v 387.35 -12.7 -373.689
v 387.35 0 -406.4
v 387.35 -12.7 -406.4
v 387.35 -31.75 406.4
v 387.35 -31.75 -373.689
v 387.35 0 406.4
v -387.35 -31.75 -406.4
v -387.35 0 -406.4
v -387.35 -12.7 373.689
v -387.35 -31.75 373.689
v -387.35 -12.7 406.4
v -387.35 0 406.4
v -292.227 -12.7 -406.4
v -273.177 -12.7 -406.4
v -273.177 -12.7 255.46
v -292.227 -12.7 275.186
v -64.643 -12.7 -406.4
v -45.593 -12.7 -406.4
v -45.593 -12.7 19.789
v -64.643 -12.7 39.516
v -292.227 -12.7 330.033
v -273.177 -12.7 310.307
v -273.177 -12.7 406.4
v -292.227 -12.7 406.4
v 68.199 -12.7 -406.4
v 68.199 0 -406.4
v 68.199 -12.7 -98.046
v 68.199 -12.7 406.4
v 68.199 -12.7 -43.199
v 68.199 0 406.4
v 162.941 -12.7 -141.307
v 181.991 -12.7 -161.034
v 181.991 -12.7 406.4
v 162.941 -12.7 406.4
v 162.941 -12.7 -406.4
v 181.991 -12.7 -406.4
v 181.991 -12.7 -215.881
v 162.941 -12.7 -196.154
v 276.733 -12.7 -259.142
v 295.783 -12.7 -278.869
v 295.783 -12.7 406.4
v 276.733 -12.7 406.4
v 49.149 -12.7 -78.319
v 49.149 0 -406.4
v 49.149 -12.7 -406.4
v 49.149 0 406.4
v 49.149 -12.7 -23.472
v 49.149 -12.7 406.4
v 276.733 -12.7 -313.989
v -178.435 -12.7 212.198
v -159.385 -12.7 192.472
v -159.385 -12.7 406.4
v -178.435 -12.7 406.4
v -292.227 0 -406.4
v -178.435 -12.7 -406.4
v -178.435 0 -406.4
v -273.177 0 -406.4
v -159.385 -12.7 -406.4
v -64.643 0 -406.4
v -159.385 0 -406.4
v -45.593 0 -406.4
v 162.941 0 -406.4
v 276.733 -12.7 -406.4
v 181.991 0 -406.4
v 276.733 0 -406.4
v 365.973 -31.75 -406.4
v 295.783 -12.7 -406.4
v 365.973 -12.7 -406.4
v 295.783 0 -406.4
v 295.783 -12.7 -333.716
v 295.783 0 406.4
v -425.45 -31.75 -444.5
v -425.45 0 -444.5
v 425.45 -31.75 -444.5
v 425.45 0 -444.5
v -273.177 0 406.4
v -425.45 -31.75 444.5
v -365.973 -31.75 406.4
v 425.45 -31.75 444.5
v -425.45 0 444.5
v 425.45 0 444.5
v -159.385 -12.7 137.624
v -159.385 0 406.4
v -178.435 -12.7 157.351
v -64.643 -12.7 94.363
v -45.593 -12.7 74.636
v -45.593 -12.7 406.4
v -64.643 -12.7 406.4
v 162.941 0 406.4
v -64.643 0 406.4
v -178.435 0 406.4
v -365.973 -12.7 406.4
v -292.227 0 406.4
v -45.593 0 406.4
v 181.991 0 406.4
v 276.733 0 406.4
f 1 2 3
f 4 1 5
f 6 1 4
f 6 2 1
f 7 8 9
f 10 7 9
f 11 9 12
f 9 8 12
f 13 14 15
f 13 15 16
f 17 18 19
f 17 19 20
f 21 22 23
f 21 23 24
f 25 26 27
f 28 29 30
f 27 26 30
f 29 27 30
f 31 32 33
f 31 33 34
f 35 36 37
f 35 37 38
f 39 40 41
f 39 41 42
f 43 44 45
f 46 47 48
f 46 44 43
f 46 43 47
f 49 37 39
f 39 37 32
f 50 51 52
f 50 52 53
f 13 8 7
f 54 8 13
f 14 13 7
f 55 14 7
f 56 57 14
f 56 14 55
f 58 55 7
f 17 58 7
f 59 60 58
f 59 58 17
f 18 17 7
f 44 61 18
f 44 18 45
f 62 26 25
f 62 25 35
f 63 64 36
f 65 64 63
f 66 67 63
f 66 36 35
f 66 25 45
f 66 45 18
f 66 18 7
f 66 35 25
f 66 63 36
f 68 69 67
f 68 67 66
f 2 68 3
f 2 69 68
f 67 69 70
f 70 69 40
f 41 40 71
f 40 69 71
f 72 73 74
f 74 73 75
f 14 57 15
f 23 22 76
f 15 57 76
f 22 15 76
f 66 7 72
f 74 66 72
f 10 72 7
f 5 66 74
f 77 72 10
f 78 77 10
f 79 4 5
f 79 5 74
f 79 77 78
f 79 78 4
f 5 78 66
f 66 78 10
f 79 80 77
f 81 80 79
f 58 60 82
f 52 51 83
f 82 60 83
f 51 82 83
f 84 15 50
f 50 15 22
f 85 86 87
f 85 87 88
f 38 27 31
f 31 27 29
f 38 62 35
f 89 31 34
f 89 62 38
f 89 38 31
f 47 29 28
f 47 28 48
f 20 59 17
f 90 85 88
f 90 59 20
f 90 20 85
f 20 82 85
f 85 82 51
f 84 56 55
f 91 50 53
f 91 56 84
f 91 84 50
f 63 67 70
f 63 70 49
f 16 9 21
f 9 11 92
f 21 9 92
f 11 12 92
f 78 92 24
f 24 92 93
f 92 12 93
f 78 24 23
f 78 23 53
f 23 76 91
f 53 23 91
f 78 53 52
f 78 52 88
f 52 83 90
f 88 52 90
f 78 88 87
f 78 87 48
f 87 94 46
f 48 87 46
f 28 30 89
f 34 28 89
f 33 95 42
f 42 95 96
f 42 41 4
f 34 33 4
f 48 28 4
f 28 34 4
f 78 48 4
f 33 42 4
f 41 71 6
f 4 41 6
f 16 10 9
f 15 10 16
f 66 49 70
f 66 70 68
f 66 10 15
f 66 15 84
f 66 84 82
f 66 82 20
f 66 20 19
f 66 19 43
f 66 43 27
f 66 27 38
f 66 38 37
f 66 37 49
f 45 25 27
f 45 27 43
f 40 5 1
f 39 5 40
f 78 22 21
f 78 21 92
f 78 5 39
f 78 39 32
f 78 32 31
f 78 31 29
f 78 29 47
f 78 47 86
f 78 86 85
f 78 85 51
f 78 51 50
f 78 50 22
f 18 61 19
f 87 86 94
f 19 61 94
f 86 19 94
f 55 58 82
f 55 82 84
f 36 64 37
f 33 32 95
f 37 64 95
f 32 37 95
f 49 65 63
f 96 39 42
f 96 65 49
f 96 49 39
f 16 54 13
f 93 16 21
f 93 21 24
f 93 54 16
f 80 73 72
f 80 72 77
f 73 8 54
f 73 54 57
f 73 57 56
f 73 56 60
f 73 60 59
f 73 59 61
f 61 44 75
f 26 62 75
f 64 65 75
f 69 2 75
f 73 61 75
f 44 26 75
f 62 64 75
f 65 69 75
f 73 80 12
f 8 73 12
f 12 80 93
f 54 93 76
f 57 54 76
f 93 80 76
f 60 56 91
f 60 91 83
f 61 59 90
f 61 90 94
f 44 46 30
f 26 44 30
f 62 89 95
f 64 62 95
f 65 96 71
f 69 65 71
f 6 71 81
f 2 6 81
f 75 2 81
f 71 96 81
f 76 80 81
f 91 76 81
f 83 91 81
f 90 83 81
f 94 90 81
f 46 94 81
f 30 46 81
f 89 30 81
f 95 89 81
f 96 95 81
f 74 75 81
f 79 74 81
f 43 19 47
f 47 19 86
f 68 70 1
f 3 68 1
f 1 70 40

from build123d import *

# Parameters (mm, degrees)
F0_W     = 850.9
F0_H     = 889
F0_W_2   = 774.7
F0_H_2   = 812.8
F1_DEPTH = 31.75
F2_W     = 19.05
F2_H     = 812.8
F3_DEPTH = 12.7
F5_DEPTH = 19.05


with BuildPart() as f1:
    # F0 (on Front) → F1 (new body)
    with BuildSketch(Plane.XZ):
        Rectangle(F0_W, F0_H)
        Rectangle(F0_W_2, F0_H_2, mode=Mode.SUBTRACT)
    extrude(amount=F1_DEPTH)

    # F2 (on face) → F3 (join)
    with BuildSketch(Plane(origin=(0, 0, 0), x_dir=(-1, 0, 0), z_dir=(0, 1, 0))):
        with Locations((-286.258, 0)):
            Rectangle(F2_W, F2_H)
        with Locations((-172.466, 0)):
            Rectangle(F2_W, F2_H)
        with Locations((-58.674, 0)):
            Rectangle(F2_W, F2_H)
        with Locations((55.118, 0)):
            Rectangle(F2_W, F2_H)
        with Locations((168.91, 0)):
            Rectangle(F2_W, F2_H)
        with Locations((282.702, 0)):
            Rectangle(F2_W, F2_H)
    extrude(amount=-F3_DEPTH)

    # F4 (on face) → F5 (join)
    with BuildSketch(Plane.XZ.offset(31.75)):
        Polygon((387.35, -373.689115), (-365.973302, 406.4), (-387.35, 406.4), (-387.35, 373.689115), (365.973302, -406.4), (387.35, -406.4), align=None)
    extrude(amount=-F5_DEPTH)


solid = f1.part
